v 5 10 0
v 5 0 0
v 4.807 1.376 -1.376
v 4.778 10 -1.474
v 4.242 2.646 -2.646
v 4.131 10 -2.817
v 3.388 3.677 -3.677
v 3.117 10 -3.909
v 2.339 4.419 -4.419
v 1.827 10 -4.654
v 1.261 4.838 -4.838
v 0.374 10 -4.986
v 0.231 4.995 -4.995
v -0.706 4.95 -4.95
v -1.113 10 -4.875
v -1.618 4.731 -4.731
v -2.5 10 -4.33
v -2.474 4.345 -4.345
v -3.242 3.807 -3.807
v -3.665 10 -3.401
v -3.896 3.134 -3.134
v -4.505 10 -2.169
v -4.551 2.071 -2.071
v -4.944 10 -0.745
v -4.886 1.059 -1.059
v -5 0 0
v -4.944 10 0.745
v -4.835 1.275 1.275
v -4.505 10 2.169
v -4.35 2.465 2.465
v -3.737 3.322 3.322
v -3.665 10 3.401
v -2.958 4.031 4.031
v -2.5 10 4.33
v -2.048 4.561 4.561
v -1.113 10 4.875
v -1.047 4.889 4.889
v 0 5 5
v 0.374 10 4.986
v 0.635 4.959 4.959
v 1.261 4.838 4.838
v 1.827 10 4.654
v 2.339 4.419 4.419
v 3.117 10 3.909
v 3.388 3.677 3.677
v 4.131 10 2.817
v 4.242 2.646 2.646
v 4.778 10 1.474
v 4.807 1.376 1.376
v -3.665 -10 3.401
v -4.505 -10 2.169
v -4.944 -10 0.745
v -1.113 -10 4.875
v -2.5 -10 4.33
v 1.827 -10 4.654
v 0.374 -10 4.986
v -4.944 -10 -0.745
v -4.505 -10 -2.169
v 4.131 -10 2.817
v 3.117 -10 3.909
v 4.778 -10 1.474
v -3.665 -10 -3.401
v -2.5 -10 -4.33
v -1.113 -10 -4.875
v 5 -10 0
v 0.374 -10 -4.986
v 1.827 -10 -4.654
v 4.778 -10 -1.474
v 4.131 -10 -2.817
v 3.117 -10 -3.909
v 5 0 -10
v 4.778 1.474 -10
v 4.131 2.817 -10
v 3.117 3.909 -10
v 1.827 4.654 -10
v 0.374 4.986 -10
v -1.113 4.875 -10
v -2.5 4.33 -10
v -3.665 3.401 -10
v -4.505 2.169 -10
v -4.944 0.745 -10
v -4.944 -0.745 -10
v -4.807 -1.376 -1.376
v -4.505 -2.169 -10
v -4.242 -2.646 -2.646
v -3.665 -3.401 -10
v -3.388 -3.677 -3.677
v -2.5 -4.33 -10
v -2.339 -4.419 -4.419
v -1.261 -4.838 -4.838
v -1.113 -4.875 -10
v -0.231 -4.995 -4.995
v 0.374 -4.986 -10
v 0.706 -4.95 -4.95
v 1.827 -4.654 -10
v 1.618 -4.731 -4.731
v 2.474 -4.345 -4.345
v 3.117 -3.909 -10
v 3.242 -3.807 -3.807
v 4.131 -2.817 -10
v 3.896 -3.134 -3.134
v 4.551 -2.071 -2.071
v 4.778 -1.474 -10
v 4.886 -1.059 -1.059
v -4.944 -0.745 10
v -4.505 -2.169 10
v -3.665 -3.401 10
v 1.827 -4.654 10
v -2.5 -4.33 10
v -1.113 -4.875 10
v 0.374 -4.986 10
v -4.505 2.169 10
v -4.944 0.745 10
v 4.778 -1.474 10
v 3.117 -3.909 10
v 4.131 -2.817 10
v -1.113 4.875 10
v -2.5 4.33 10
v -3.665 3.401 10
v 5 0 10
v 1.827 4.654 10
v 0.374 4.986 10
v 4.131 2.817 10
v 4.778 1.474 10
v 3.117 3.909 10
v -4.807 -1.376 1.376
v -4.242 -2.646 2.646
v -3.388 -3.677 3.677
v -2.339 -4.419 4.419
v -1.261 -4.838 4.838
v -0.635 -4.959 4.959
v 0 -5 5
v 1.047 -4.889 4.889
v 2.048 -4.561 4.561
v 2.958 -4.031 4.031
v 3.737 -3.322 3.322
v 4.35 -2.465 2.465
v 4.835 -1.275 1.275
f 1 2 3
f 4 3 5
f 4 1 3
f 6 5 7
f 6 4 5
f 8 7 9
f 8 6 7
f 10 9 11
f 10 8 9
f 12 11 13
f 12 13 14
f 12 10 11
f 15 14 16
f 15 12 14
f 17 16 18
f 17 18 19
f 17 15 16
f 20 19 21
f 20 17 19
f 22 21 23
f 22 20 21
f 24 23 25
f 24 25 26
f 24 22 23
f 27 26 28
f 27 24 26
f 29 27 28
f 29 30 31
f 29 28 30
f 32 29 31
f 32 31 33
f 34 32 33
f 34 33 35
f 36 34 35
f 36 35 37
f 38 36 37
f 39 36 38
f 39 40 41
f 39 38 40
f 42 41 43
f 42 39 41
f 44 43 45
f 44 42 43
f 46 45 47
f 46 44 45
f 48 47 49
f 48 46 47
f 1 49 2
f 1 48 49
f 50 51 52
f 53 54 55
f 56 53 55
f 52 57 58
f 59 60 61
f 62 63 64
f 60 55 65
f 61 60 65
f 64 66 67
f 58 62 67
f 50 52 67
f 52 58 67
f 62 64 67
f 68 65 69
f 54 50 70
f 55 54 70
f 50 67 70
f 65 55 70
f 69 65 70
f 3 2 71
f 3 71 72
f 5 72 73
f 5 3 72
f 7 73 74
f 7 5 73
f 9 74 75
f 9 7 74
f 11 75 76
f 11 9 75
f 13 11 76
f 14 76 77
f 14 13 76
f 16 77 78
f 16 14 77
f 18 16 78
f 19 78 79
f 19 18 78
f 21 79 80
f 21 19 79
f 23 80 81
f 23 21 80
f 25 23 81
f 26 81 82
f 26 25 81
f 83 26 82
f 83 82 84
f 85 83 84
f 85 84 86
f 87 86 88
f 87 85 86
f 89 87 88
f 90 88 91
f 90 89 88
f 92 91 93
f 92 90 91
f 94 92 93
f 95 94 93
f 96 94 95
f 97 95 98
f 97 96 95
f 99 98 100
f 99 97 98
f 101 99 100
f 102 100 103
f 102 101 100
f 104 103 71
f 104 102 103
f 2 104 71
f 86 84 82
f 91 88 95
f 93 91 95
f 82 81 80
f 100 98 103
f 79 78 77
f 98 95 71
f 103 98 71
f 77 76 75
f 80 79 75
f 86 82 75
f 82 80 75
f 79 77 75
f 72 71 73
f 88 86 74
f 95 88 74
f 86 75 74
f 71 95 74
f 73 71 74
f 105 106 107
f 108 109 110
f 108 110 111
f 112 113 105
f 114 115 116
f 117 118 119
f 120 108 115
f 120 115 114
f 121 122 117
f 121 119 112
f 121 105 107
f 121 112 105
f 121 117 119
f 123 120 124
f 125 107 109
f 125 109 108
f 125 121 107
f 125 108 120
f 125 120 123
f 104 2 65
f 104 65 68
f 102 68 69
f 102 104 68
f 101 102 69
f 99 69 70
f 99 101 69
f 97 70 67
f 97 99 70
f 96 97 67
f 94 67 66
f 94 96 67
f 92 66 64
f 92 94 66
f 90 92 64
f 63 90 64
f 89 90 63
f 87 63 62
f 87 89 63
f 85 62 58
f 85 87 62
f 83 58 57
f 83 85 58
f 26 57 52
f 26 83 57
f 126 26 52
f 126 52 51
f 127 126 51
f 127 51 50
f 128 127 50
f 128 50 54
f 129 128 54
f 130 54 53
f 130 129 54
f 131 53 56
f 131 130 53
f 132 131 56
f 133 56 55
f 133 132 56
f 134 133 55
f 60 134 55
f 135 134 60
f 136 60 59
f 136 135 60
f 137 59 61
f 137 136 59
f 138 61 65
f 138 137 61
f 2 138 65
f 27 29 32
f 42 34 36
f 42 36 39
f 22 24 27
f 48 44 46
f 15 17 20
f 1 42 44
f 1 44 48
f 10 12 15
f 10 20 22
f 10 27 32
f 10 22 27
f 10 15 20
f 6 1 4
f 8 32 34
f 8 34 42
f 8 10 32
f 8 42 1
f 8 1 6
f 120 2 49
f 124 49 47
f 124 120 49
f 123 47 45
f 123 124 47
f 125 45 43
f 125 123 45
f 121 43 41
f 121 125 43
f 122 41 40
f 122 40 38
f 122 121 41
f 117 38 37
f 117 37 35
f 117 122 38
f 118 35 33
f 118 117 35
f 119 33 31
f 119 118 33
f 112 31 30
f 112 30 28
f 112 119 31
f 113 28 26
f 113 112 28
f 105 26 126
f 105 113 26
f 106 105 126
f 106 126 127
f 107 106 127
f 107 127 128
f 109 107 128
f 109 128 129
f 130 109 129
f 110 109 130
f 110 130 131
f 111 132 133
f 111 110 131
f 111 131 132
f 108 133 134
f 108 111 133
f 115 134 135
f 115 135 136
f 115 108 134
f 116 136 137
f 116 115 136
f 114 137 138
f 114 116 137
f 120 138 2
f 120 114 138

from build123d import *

# Parameters (mm, degrees)
SKETCH1_R           = 5
BOSS_EXTRUDE1_DEPTH = 10
SKETCH2_R           = 5
BOSS_EXTRUDE2_DEPTH = 10


with BuildPart() as part:
    # Sketch1 → Boss-Extrude1 (new body, symmetric)
    with BuildSketch(Plane.XY):
        Circle(SKETCH1_R)
    extrude(amount=BOSS_EXTRUDE1_DEPTH, both=True)

    # Sketch2 → Boss-Extrude2 (add, symmetric)
    with BuildSketch(Plane(origin=(0, 0, 0), x_dir=(1, 0, 0), z_dir=(0, 1, 0))):
        Circle(SKETCH2_R)
    extrude(amount=BOSS_EXTRUDE2_DEPTH, both=True)


solid = part.part
